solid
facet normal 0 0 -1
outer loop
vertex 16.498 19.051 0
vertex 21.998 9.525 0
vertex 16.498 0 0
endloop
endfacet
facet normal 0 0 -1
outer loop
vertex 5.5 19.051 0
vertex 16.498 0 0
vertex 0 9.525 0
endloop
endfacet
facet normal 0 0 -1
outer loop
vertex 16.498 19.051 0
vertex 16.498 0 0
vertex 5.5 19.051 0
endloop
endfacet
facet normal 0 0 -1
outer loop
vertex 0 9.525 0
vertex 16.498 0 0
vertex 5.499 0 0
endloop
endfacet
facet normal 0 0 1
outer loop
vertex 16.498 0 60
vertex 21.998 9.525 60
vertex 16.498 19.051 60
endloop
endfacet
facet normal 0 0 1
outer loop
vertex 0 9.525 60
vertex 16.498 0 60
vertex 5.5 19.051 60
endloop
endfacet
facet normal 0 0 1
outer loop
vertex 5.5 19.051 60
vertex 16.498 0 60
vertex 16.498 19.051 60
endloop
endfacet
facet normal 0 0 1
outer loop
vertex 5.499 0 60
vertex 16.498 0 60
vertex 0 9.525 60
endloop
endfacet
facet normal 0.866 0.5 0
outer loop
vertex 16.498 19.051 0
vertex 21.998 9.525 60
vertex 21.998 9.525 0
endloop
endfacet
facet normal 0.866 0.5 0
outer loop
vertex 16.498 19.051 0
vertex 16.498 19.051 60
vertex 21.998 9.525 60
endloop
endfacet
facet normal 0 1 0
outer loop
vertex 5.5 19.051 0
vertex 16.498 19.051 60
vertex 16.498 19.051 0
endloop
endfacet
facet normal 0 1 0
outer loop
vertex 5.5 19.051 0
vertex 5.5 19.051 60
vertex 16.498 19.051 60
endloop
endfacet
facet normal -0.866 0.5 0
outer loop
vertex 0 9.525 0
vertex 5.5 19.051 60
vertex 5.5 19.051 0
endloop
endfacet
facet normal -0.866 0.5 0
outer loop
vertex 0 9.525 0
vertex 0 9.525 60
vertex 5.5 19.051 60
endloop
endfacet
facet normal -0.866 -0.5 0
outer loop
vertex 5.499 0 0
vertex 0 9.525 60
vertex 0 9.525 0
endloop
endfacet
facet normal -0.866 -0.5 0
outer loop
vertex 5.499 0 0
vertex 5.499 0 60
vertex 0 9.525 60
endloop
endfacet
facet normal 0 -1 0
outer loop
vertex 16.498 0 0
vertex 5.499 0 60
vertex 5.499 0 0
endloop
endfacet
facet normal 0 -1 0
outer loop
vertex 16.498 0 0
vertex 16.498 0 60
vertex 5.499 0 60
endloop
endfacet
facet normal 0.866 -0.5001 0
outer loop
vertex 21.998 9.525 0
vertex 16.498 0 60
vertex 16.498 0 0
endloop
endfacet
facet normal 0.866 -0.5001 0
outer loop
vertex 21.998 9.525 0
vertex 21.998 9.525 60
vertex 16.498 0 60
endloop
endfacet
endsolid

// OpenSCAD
$fn = 32;

// ----------------------------------------------------------------------
// Key bar: hex key, 60 mm thick
// ----------------------------------------------------------------------

// --- parameters (mm) ---
profile_height = 60;      // extrusion height
profile_points = 6;       // points of the closed outline

profile = [[21.998, 9.525], [16.498, 19.051], [5.5, 19.051], [0, 9.525], [5.499, 0], [16.498, 0]];  // single closed polygon, 6 points, counter clockwise

// --- the one profile operation ---
linear_extrude(height = profile_height) polygon(points = profile);
